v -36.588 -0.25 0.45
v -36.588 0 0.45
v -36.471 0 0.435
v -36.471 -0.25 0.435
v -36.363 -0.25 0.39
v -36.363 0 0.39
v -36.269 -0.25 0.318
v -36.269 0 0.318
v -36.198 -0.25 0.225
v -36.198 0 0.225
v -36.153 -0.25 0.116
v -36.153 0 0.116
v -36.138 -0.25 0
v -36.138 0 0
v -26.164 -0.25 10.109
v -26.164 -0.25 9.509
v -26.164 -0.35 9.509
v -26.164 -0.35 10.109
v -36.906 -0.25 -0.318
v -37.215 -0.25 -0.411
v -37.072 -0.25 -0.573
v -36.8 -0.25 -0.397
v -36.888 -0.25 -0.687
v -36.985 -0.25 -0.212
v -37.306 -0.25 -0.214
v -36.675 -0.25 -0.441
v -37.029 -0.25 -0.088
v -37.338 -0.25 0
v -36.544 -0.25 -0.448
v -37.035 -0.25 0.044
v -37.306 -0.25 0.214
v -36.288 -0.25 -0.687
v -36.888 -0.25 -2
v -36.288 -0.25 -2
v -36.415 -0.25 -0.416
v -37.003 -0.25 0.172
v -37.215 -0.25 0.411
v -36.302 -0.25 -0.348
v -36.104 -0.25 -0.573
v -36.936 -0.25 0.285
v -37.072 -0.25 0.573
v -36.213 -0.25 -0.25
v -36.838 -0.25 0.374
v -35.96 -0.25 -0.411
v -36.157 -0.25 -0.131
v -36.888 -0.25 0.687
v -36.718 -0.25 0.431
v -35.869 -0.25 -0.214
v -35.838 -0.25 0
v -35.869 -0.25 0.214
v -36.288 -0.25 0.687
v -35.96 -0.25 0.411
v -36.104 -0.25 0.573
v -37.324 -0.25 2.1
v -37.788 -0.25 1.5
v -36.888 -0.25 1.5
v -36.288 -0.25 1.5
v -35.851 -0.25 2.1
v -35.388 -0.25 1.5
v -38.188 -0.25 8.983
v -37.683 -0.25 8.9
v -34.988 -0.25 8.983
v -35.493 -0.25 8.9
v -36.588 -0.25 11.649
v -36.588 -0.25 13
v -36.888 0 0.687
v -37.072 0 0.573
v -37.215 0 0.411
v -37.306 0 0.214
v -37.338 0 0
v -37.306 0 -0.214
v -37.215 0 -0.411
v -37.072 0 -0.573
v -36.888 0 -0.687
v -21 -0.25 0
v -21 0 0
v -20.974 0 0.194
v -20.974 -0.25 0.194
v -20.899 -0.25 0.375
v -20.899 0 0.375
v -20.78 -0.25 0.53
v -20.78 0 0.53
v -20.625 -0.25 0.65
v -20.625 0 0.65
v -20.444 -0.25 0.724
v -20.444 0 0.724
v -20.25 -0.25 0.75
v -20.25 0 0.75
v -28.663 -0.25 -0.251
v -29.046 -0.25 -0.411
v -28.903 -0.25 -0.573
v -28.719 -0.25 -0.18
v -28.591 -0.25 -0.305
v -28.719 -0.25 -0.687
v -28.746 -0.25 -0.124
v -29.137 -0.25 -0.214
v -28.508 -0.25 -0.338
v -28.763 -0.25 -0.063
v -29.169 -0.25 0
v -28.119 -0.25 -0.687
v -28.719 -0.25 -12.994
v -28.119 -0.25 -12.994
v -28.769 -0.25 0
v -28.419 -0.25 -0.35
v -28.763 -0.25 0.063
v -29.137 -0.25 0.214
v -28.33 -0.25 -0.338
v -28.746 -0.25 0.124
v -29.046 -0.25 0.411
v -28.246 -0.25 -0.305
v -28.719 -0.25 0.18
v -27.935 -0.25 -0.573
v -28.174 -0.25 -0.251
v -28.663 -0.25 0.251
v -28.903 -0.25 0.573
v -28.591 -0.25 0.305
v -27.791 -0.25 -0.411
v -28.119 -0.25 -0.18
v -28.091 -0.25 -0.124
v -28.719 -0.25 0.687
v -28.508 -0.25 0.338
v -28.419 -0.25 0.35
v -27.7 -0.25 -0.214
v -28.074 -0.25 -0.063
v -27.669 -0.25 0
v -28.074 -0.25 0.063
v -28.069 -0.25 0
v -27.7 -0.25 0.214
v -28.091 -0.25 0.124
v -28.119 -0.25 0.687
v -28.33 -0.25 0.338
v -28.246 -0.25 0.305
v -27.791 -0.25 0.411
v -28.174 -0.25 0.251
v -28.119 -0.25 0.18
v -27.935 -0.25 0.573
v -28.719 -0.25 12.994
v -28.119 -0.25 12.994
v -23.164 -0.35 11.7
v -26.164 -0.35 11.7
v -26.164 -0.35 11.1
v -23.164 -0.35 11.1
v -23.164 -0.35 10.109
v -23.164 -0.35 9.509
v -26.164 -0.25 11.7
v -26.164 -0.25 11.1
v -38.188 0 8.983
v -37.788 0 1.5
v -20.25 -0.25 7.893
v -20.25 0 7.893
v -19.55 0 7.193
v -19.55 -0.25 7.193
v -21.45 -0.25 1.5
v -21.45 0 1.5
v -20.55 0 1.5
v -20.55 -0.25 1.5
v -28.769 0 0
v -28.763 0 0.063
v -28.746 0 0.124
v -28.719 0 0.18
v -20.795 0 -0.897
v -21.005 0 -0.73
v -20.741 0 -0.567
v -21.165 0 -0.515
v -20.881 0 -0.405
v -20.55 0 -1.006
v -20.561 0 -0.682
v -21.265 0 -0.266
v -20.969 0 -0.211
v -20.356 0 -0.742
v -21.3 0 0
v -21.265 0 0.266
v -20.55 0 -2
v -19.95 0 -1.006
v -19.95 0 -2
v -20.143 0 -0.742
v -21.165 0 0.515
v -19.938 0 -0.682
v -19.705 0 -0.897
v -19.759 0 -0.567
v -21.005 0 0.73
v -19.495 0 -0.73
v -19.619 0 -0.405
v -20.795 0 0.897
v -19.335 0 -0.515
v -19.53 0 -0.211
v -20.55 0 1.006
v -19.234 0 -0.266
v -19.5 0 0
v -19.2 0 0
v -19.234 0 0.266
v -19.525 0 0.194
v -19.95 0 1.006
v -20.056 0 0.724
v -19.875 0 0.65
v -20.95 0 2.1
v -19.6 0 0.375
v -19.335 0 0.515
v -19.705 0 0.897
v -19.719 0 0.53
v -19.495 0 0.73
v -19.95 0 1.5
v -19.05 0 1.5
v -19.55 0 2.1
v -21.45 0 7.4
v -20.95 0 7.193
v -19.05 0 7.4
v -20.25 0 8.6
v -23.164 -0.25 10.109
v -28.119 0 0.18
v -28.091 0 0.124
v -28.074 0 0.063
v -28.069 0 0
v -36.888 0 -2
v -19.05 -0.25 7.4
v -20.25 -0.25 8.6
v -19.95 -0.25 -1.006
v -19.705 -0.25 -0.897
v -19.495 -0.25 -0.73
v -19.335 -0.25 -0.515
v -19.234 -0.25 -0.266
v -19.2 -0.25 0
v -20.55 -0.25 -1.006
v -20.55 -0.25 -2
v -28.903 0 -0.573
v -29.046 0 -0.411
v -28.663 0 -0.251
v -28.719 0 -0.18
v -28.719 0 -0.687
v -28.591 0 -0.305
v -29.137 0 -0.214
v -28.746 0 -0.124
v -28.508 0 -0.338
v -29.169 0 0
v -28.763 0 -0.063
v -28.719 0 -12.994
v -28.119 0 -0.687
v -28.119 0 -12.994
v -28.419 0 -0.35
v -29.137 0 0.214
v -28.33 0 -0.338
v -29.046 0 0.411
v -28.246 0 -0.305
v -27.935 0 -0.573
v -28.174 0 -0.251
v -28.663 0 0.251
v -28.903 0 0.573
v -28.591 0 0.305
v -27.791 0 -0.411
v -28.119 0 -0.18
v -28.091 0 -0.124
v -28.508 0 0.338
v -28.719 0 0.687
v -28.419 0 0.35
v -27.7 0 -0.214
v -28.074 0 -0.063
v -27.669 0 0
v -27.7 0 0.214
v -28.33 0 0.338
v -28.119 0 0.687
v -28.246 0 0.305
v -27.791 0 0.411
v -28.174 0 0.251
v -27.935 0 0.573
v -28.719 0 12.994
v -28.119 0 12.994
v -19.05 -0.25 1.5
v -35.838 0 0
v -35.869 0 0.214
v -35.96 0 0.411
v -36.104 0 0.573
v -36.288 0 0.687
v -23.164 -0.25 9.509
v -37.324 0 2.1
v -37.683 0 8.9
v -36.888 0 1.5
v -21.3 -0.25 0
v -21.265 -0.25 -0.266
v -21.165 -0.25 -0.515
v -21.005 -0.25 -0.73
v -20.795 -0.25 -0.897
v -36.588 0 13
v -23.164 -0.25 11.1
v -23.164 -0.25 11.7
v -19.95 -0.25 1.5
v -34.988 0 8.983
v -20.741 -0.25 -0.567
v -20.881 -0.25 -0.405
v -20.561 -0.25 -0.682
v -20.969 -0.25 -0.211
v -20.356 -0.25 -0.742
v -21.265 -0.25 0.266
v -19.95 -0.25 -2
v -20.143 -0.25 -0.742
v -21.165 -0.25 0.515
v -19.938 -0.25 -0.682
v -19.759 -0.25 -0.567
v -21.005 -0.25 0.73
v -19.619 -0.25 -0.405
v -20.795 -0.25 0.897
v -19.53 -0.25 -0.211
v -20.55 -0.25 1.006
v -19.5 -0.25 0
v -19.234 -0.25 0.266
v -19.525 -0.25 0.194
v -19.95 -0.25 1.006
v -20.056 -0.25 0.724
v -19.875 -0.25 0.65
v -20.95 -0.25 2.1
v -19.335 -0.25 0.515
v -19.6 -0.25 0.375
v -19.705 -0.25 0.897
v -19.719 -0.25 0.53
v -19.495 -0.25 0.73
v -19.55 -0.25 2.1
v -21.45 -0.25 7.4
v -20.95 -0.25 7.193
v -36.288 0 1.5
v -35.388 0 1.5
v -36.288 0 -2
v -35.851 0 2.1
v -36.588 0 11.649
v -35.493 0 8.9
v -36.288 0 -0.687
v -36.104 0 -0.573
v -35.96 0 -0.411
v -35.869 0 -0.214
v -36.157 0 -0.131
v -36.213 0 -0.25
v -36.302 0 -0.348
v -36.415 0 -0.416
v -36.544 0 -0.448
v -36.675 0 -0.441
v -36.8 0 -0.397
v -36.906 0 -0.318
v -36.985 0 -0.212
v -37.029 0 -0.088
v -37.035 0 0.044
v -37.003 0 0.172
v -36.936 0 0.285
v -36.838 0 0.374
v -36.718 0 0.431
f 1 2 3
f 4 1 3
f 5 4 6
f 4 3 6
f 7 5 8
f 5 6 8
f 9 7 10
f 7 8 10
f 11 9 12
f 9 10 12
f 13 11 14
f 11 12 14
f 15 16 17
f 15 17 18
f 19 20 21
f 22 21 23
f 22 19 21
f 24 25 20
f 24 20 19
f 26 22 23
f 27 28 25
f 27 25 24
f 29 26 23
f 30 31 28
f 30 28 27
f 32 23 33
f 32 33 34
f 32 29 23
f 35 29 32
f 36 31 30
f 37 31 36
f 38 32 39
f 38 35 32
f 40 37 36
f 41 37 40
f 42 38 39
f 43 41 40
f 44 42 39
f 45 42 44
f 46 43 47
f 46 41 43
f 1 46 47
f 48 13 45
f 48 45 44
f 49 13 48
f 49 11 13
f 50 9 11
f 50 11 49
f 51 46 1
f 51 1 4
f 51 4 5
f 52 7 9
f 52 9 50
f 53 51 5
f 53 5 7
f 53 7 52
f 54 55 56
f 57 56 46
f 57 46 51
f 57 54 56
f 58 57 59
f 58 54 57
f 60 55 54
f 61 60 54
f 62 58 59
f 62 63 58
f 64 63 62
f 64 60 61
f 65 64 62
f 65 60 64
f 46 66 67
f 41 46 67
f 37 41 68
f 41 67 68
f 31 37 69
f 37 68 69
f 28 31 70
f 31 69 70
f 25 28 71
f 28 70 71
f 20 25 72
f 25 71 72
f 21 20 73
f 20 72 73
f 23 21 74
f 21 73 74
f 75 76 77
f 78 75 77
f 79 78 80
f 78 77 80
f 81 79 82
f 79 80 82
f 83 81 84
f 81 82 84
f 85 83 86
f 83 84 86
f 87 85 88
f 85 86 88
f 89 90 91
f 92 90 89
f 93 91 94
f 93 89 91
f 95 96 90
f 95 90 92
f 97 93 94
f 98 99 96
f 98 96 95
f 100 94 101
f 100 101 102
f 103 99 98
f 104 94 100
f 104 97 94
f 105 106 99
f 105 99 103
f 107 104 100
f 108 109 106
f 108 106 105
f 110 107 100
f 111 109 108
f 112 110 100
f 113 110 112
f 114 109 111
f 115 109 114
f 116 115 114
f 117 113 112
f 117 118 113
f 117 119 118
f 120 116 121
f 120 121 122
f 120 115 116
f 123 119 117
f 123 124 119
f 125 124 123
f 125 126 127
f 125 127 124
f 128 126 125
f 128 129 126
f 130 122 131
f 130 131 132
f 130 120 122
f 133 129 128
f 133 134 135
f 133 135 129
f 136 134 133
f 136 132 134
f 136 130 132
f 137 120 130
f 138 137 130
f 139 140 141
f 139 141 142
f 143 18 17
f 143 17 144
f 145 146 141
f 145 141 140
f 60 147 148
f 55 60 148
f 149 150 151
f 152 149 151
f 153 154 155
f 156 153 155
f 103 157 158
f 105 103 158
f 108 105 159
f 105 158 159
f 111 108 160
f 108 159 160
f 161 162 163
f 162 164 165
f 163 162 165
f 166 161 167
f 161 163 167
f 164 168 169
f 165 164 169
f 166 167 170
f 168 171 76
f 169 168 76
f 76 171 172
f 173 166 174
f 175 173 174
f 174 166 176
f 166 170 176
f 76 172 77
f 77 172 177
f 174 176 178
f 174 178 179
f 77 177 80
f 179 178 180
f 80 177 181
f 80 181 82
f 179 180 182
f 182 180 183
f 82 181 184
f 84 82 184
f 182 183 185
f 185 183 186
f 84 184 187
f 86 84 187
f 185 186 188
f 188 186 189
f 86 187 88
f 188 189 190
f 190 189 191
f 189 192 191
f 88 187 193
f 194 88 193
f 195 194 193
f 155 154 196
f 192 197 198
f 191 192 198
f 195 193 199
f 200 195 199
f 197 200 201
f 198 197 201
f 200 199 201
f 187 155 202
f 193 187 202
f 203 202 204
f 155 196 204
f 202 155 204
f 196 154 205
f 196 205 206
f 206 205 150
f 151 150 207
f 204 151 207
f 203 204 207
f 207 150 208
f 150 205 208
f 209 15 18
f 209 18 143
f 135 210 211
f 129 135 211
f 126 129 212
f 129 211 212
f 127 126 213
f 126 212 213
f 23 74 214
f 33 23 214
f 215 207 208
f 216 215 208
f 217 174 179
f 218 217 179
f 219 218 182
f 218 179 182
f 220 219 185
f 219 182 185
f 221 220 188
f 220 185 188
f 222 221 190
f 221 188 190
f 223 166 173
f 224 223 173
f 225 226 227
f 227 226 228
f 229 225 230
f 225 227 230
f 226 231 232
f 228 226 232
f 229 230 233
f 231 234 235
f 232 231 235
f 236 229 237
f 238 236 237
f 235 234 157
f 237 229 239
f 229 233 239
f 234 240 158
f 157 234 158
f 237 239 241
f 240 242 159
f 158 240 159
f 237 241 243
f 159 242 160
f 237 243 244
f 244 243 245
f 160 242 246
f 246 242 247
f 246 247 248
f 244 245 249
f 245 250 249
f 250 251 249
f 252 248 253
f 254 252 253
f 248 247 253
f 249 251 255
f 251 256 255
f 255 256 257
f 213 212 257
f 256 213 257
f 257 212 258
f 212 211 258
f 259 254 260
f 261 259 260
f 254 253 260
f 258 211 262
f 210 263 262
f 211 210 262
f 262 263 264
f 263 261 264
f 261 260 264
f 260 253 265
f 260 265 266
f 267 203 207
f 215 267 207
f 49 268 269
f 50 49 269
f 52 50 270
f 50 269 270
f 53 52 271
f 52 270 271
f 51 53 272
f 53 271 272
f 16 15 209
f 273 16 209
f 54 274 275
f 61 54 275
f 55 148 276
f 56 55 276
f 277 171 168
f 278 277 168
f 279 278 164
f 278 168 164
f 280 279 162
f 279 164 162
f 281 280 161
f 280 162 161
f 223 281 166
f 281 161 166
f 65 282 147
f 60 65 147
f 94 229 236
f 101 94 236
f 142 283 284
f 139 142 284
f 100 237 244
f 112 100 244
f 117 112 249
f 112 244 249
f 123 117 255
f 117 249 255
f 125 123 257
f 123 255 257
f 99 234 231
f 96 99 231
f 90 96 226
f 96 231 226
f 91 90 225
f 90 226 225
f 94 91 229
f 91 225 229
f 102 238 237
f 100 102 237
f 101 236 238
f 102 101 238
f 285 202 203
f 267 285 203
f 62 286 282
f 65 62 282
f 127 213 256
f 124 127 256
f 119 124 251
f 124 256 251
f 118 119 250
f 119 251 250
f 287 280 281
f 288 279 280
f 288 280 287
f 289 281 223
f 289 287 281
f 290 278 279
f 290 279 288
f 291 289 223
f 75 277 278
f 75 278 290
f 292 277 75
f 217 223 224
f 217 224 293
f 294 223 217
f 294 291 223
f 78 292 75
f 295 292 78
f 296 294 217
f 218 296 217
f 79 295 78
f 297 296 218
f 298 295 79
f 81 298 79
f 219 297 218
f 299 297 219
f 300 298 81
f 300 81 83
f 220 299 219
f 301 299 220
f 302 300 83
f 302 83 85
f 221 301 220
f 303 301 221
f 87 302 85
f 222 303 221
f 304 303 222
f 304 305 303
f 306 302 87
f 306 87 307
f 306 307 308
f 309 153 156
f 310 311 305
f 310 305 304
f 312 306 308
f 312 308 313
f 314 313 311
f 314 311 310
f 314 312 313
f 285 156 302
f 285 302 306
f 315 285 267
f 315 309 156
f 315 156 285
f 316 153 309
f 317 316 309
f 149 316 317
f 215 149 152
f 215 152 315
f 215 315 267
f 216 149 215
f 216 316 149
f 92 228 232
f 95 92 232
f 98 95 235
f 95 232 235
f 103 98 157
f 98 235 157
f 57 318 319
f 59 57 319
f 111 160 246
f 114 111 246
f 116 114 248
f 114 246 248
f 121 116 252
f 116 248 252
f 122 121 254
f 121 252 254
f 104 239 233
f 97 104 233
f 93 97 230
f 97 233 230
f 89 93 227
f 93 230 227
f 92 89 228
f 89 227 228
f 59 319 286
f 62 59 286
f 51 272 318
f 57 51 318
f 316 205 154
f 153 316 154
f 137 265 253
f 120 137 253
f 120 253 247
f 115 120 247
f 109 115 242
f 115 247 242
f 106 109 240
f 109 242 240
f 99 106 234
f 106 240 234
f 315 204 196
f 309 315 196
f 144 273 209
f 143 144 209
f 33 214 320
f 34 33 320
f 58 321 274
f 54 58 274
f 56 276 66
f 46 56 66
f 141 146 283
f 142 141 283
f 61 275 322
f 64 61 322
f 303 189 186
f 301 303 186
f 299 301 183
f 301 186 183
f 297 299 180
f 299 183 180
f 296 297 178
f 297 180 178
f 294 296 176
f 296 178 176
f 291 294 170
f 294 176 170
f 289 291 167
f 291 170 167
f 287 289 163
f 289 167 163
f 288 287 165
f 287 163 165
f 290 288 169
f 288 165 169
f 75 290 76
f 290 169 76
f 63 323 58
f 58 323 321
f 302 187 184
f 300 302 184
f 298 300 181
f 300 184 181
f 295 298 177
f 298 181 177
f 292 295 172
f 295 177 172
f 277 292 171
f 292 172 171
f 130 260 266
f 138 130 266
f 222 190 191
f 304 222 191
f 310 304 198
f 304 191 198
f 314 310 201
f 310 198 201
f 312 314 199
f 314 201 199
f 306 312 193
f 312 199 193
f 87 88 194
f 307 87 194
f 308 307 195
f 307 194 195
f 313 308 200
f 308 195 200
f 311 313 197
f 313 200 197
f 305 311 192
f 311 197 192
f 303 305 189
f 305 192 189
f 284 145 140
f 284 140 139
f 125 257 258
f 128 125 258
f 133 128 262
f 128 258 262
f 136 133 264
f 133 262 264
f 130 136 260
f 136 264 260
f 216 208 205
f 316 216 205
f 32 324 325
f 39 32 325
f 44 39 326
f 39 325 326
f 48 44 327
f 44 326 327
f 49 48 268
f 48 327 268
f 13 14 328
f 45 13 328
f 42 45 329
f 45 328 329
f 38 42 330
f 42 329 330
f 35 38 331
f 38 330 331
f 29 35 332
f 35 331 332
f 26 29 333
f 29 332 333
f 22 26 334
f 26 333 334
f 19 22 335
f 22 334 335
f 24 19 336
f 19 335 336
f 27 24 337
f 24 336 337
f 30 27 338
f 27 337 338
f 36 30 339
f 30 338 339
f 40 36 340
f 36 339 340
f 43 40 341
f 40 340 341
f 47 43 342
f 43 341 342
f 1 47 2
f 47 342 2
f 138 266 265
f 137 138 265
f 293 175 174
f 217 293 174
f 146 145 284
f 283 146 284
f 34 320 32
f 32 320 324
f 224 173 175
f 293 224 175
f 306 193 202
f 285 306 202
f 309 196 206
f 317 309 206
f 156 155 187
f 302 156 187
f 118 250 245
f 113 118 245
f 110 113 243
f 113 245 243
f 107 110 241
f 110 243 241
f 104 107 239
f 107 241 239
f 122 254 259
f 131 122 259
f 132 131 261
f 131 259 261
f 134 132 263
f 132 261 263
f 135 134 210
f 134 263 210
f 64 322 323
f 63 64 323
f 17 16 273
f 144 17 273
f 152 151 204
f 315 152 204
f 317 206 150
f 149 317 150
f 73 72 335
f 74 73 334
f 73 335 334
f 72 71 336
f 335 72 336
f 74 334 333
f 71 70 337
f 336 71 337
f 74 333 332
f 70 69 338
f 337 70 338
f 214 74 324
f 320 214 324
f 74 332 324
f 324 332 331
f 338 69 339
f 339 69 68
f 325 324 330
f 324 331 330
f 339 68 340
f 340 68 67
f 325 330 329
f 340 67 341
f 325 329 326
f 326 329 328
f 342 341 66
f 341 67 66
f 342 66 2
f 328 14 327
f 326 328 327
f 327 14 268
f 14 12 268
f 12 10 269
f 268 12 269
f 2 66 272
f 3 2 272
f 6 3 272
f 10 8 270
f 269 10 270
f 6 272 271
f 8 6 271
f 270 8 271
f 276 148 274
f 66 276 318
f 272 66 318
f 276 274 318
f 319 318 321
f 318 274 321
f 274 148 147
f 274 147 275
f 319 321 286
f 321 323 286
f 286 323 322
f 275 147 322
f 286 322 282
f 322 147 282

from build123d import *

# Parameters (mm, degrees)
F0_W     = 0.5
F0_H     = 0.6
F1_DEPTH = 0.25
F0_W_2   = 3
F2_DEPTH = 0.1


# Not quite as in the source:
# - a feature names something its author has since deleted; it is built from what else it names


with BuildPart() as f1:
    # F0 (on Front) → F1 (new body)
    with BuildSketch(Plane.XZ):
        with BuildLine():
            ThreePointArc((-20.5497518182, 1.0062305899), (-21.0916247302, 0.6274950199), (-21.2997518182, 0))
            Line((-21.2997518182, 0), (-20.9997518182, 0))
            ThreePointArc((-20.9997518182, 0), (-20.7800819041, 0.5303300859), (-20.2497518182, 0.75))
            Line((-20.2497518182, 0.75), (-20.2497518182, 1.05))
            ThreePointArc((-20.2497518182, 1.05), (-20.4013398794, 1.0390000287), (-20.5497518182, 1.0062305899))
        make_face()
        with BuildLine():
            Line((-20.9997518182, 0), (-21.2997518182, 0))
            ThreePointArc((-21.2997518182, 0), (-21.0916247302, -0.6274950199), (-20.5497518182, -1.0062305899))
            ThreePointArc((-20.5497518182, -1.0062305899), (-20.2497518182, -1.05), (-19.9497518182, -1.0062305899))
            ThreePointArc((-19.9497518182, -1.0062305899), (-19.4078789062, -0.6274950199), (-19.1997518182, 0))
            ThreePointArc((-19.1997518182, 0), (-19.4078789062, 0.6274950199), (-19.9497518182, 1.0062305899))
            ThreePointArc((-19.9497518182, 1.0062305899), (-20.0981637569, 1.0390000287), (-20.2497518182, 1.05))
            Line((-20.2497518182, 1.05), (-20.2497518182, 0.75))
            ThreePointArc((-20.2497518182, 0.75), (-19.7194217323, 0.5303300859), (-19.4997518182, 0))
            ThreePointArc((-19.4997518182, 0), (-20.2497518182, -0.75), (-20.9997518182, 0))
        make_face()
        with BuildLine():
            Line((-20.5497518182, 1.5), (-20.5497518182, 1.0062305899))
            ThreePointArc((-20.5497518182, 1.0062305899), (-20.4013398794, 1.0390000287), (-20.2497518182, 1.05))
            Line((-20.2497518182, 1.05), (-20.2497518182, 1.5))
            Line((-20.2497518182, 1.5), (-20.5497518182, 1.5))
        make_face()
        with BuildLine():
            ThreePointArc((-19.9497518182, -1.0062305899), (-20.2497518182, -1.05), (-20.5497518182, -1.0062305899))
            Line((-20.5497518182, -1.0062305899), (-20.5497518182, -2))
            Line((-20.5497518182, -2), (-19.9497518182, -2))
            Line((-19.9497518182, -2), (-19.9497518182, -1.0062305899))
        make_face()
        with BuildLine():
            Line((-20.2497518182, 1.5), (-20.2497518182, 1.05))
            ThreePointArc((-20.2497518182, 1.05), (-20.0981637569, 1.0390000287), (-19.9497518182, 1.0062305899))
            Line((-19.9497518182, 1.0062305899), (-19.9497518182, 1.5))
            Line((-19.9497518182, 1.5), (-20.2497518182, 1.5))
        make_face()
        Polygon((-20.9497518182, 1.5), (-20.5497518182, 1.5), (-20.2497518182, 1.5), (-20.2497518182, 2.1), (-20.9497518182, 2.1), align=None)
        Polygon((-20.2497518182, 2.1), (-20.2497518182, 1.5), (-19.9497518182, 1.5), (-19.5497518182, 1.5), (-19.5497518182, 2.1), align=None)
        with Locations((-21.1997518182, 1.8)):
            Rectangle(F0_W, F0_H)
        Polygon((-21.4497518182, 2.1), (-20.9497518182, 2.1), (-20.9497518182, 7.1928932188), (-20.2497518182, 7.8928932188), (-20.2497518182, 8.6), (-21.4497518182, 7.4), align=None)
        with Locations((-19.2997518182, 1.8)):
            Rectangle(F0_W, F0_H)
        Polygon((-20.2497518182, 8.6), (-20.2497518182, 7.8928932188), (-19.5497518182, 7.1928932188), (-19.5497518182, 2.1), (-19.0497518182, 2.1), (-19.0497518182, 7.4), align=None)
    extrude(amount=F1_DEPTH)


with BuildPart() as f1b:
    # F0 (on Front) → F1, piece 2 (new body)
    with BuildSketch(Plane.XZ):
        with BuildLine():
            ThreePointArc((-28.7187018186, 0.6873863542), (-29.0461968385, 0.4107919181), (-29.1687018186, 0))
            Line((-29.1687018186, 0), (-28.7687018186, 0))
            ThreePointArc((-28.7687018186, 0), (-28.7559702577, 0.0935414347), (-28.7187018186, 0.1802775638))
            Line((-28.7187018186, 0.1802775638), (-28.7187018186, 0.6873863542))
        make_face()
        with BuildLine():
            Line((-28.7687018186, 0), (-29.1687018186, 0))
            ThreePointArc((-29.1687018186, 0), (-29.0461968385, -0.4107919181), (-28.7187018186, -0.6873863542))
            Line((-28.7187018186, -0.6873863542), (-28.7187018186, -0.1802775638))
            ThreePointArc((-28.7187018186, -0.1802775638), (-28.7559702577, -0.0935414347), (-28.7687018186, 0))
        make_face()
        with BuildLine():
            Line((-28.7187018186, 12.9938064694), (-28.7187018186, 0.6873863542))
            ThreePointArc((-28.7187018186, 0.6873863542), (-28.5719340514, 0.7341797347), (-28.4187018186, 0.75))
            Line((-28.4187018186, 0.75), (-28.4187018186, 12.9938064694))
            Line((-28.4187018186, 12.9938064694), (-28.7187018186, 12.9938064694))
        make_face()
        with BuildLine():
            ThreePointArc((-28.4187018186, 0.75), (-28.5719340514, 0.7341797347), (-28.7187018186, 0.6873863542))
            Line((-28.7187018186, 0.6873863542), (-28.7187018186, 0.1802775638))
            ThreePointArc((-28.7187018186, 0.1802775638), (-28.5910428362, 0.3046285831), (-28.4187018186, 0.35))
            Line((-28.4187018186, 0.35), (-28.4187018186, 0.75))
        make_face()
        with BuildLine():
            Line((-28.7187018186, -0.1802775638), (-28.7187018186, -0.6873863542))
            ThreePointArc((-28.7187018186, -0.6873863542), (-28.5719340514, -0.7341797347), (-28.4187018186, -0.75))
            Line((-28.4187018186, -0.75), (-28.4187018186, -0.35))
            ThreePointArc((-28.4187018186, -0.35), (-28.5910428362, -0.3046285831), (-28.7187018186, -0.1802775638))
        make_face()
        with BuildLine():
            ThreePointArc((-28.4187018186, -0.75), (-28.5719340514, -0.7341797347), (-28.7187018186, -0.6873863542))
            Line((-28.7187018186, -0.6873863542), (-28.7187018186, -12.9938064694))
            Line((-28.7187018186, -12.9938064694), (-28.4187018186, -12.9938064694))
            Line((-28.4187018186, -12.9938064694), (-28.4187018186, -0.75))
        make_face()
        with BuildLine():
            Line((-28.4187018186, 12.9938064694), (-28.4187018186, 0.75))
            ThreePointArc((-28.4187018186, 0.75), (-28.2654695858, 0.7341797347), (-28.1187018186, 0.6873863542))
            Line((-28.1187018186, 0.6873863542), (-28.1187018186, 12.9938064694))
            Line((-28.1187018186, 12.9938064694), (-28.4187018186, 12.9938064694))
        make_face()
        with BuildLine():
            ThreePointArc((-28.1187018186, 0.6873863542), (-28.2654695858, 0.7341797347), (-28.4187018186, 0.75))
            Line((-28.4187018186, 0.75), (-28.4187018186, 0.35))
            ThreePointArc((-28.4187018186, 0.35), (-28.246360801, 0.3046285831), (-28.1187018186, 0.1802775638))
            Line((-28.1187018186, 0.1802775638), (-28.1187018186, 0.6873863542))
        make_face()
        with BuildLine():
            Line((-28.4187018186, -0.35), (-28.4187018186, -0.75))
            ThreePointArc((-28.4187018186, -0.75), (-28.2654695858, -0.7341797347), (-28.1187018186, -0.6873863542))
            Line((-28.1187018186, -0.6873863542), (-28.1187018186, -0.1802775638))
            ThreePointArc((-28.1187018186, -0.1802775638), (-28.246360801, -0.3046285831), (-28.4187018186, -0.35))
        make_face()
        with BuildLine():
            ThreePointArc((-28.1187018186, -0.6873863542), (-28.2654695858, -0.7341797347), (-28.4187018186, -0.75))
            Line((-28.4187018186, -0.75), (-28.4187018186, -12.9938064694))
            Line((-28.4187018186, -12.9938064694), (-28.1187018186, -12.9938064694))
            Line((-28.1187018186, -12.9938064694), (-28.1187018186, -0.6873863542))
        make_face()
        with BuildLine():
            ThreePointArc((-27.6687018186, 0), (-27.7912067987, 0.4107919181), (-28.1187018186, 0.6873863542))
            Line((-28.1187018186, 0.6873863542), (-28.1187018186, 0.1802775638))
            ThreePointArc((-28.1187018186, 0.1802775638), (-28.0814333795, 0.0935414347), (-28.0687018186, 0))
            Line((-28.0687018186, 0), (-27.6687018186, 0))
        make_face()
        with BuildLine():
            Line((-28.1187018186, -0.1802775638), (-28.1187018186, -0.6873863542))
            ThreePointArc((-28.1187018186, -0.6873863542), (-27.7912067987, -0.4107919181), (-27.6687018186, 0))
            Line((-27.6687018186, 0), (-28.0687018186, 0))
            ThreePointArc((-28.0687018186, 0), (-28.0814333795, -0.0935414347), (-28.1187018186, -0.1802775638))
        make_face()
    extrude(amount=F1_DEPTH)


with BuildPart() as f1c:
    # F0 (on Front) → F1, piece 3 (new body)
    with BuildSketch(Plane.XZ):
        Polygon((-34.987651819, 8.9829219505), (-36.587651819, 13), (-36.587651819, 11.6487521661), (-35.4928014695, 8.8999400996), (-35.850947132, 2.1), (-36.587651819, 2.1), (-36.587651819, 1.5), (-36.287651819, 1.5), (-35.387651819, 1.5), align=None)
        Polygon((-36.587651819, 11.6487521661), (-36.587651819, 13), (-38.187651819, 8.9829219505), (-37.787651819, 1.5), (-36.887651819, 1.5), (-36.587651819, 1.5), (-36.587651819, 2.1), (-37.3243565059, 2.1), (-37.6825021685, 8.8999400996), align=None)
        with BuildLine():
            Line((-36.287651819, 0.6873863542), (-36.287651819, 1.5))
            Line((-36.287651819, 1.5), (-36.587651819, 1.5))
            Line((-36.587651819, 1.5), (-36.587651819, 0.75))
            ThreePointArc((-36.587651819, 0.75), (-36.4344195862, 0.7341797347), (-36.287651819, 0.6873863542))
        make_face()
        with BuildLine():
            Line((-36.587651819, 0.75), (-36.587651819, 1.5))
            Line((-36.587651819, 1.5), (-36.887651819, 1.5))
            Line((-36.887651819, 1.5), (-36.887651819, 0.6873863542))
            ThreePointArc((-36.887651819, 0.6873863542), (-36.7408840518, 0.7341797347), (-36.587651819, 0.75))
        make_face()
        with BuildLine():
            ThreePointArc((-35.837651819, 0), (-35.9601567991, 0.4107919181), (-36.287651819, 0.6873863542))
            ThreePointArc((-36.287651819, 0.6873863542), (-36.4344195862, 0.7341797347), (-36.587651819, 0.75))
            Line((-36.587651819, 0.75), (-36.587651819, 0.45))
            ThreePointArc((-36.587651819, 0.45), (-36.2694537675, 0.3181980515), (-36.137651819, 0))
            Line((-36.137651819, 0), (-35.837651819, 0))
        make_face()
        with BuildLine():
            Line((-36.587651819, 0.45), (-36.587651819, 0.75))
            ThreePointArc((-36.587651819, 0.75), (-36.7408840518, 0.7341797347), (-36.887651819, 0.6873863542))
            ThreePointArc((-36.887651819, 0.6873863542), (-37.337651819, 0), (-36.887651819, -0.6873863542))
            ThreePointArc((-36.887651819, -0.6873863542), (-36.587651819, -0.75), (-36.287651819, -0.6873863542))
            ThreePointArc((-36.287651819, -0.6873863542), (-35.9601567991, -0.4107919181), (-35.837651819, 0))
            Line((-35.837651819, 0), (-36.137651819, 0))
            ThreePointArc((-36.137651819, 0), (-36.9058498705, -0.3181980515), (-36.587651819, 0.45))
        make_face()
        with BuildLine():
            ThreePointArc((-36.287651819, -0.6873863542), (-36.587651819, -0.75), (-36.887651819, -0.6873863542))
            Line((-36.887651819, -0.6873863542), (-36.887651819, -2))
            Line((-36.887651819, -2), (-36.287651819, -2))
            Line((-36.287651819, -2), (-36.287651819, -0.6873863542))
        make_face()
    extrude(amount=F1_DEPTH)


with BuildPart() as f1d:
    # F0 (on Front) → F1, piece 4 (new body)
    with BuildSketch(Plane.XZ):
        with Locations((-24.663922295, 11.3997036099)):
            Rectangle(F0_W_2, F0_H)
    extrude(amount=F1_DEPTH)


with BuildPart() as f1e:
    # F0 (on Front) → F1, piece 5 (new body)
    with BuildSketch(Plane.XZ):
        with Locations((-24.663922295, 9.8090009272)):
            Rectangle(F0_W_2, F0_H)
    extrude(amount=F1_DEPTH)


with BuildPart() as f2:
    # F2 (new): a face of the model
    f2_faces = [f1d.part.faces().sort_by_distance(p)[0] for p in [
        (-24.663922295, -0.25, 11.3997036099),
    ]]
    extrude(f2_faces, amount=F2_DEPTH)


with BuildPart() as f2b:
    # F2#2 (new): a face of the model
    f2_2_faces = [f1e.part.faces().sort_by_distance(p)[0] for p in [
        (-24.663922295, -0.25, 9.8090009272),
    ]]
    extrude(f2_2_faces, amount=F2_DEPTH)


solid = Compound([f1.part, f1b.part, f1c.part, f2.part, f2b.part])
